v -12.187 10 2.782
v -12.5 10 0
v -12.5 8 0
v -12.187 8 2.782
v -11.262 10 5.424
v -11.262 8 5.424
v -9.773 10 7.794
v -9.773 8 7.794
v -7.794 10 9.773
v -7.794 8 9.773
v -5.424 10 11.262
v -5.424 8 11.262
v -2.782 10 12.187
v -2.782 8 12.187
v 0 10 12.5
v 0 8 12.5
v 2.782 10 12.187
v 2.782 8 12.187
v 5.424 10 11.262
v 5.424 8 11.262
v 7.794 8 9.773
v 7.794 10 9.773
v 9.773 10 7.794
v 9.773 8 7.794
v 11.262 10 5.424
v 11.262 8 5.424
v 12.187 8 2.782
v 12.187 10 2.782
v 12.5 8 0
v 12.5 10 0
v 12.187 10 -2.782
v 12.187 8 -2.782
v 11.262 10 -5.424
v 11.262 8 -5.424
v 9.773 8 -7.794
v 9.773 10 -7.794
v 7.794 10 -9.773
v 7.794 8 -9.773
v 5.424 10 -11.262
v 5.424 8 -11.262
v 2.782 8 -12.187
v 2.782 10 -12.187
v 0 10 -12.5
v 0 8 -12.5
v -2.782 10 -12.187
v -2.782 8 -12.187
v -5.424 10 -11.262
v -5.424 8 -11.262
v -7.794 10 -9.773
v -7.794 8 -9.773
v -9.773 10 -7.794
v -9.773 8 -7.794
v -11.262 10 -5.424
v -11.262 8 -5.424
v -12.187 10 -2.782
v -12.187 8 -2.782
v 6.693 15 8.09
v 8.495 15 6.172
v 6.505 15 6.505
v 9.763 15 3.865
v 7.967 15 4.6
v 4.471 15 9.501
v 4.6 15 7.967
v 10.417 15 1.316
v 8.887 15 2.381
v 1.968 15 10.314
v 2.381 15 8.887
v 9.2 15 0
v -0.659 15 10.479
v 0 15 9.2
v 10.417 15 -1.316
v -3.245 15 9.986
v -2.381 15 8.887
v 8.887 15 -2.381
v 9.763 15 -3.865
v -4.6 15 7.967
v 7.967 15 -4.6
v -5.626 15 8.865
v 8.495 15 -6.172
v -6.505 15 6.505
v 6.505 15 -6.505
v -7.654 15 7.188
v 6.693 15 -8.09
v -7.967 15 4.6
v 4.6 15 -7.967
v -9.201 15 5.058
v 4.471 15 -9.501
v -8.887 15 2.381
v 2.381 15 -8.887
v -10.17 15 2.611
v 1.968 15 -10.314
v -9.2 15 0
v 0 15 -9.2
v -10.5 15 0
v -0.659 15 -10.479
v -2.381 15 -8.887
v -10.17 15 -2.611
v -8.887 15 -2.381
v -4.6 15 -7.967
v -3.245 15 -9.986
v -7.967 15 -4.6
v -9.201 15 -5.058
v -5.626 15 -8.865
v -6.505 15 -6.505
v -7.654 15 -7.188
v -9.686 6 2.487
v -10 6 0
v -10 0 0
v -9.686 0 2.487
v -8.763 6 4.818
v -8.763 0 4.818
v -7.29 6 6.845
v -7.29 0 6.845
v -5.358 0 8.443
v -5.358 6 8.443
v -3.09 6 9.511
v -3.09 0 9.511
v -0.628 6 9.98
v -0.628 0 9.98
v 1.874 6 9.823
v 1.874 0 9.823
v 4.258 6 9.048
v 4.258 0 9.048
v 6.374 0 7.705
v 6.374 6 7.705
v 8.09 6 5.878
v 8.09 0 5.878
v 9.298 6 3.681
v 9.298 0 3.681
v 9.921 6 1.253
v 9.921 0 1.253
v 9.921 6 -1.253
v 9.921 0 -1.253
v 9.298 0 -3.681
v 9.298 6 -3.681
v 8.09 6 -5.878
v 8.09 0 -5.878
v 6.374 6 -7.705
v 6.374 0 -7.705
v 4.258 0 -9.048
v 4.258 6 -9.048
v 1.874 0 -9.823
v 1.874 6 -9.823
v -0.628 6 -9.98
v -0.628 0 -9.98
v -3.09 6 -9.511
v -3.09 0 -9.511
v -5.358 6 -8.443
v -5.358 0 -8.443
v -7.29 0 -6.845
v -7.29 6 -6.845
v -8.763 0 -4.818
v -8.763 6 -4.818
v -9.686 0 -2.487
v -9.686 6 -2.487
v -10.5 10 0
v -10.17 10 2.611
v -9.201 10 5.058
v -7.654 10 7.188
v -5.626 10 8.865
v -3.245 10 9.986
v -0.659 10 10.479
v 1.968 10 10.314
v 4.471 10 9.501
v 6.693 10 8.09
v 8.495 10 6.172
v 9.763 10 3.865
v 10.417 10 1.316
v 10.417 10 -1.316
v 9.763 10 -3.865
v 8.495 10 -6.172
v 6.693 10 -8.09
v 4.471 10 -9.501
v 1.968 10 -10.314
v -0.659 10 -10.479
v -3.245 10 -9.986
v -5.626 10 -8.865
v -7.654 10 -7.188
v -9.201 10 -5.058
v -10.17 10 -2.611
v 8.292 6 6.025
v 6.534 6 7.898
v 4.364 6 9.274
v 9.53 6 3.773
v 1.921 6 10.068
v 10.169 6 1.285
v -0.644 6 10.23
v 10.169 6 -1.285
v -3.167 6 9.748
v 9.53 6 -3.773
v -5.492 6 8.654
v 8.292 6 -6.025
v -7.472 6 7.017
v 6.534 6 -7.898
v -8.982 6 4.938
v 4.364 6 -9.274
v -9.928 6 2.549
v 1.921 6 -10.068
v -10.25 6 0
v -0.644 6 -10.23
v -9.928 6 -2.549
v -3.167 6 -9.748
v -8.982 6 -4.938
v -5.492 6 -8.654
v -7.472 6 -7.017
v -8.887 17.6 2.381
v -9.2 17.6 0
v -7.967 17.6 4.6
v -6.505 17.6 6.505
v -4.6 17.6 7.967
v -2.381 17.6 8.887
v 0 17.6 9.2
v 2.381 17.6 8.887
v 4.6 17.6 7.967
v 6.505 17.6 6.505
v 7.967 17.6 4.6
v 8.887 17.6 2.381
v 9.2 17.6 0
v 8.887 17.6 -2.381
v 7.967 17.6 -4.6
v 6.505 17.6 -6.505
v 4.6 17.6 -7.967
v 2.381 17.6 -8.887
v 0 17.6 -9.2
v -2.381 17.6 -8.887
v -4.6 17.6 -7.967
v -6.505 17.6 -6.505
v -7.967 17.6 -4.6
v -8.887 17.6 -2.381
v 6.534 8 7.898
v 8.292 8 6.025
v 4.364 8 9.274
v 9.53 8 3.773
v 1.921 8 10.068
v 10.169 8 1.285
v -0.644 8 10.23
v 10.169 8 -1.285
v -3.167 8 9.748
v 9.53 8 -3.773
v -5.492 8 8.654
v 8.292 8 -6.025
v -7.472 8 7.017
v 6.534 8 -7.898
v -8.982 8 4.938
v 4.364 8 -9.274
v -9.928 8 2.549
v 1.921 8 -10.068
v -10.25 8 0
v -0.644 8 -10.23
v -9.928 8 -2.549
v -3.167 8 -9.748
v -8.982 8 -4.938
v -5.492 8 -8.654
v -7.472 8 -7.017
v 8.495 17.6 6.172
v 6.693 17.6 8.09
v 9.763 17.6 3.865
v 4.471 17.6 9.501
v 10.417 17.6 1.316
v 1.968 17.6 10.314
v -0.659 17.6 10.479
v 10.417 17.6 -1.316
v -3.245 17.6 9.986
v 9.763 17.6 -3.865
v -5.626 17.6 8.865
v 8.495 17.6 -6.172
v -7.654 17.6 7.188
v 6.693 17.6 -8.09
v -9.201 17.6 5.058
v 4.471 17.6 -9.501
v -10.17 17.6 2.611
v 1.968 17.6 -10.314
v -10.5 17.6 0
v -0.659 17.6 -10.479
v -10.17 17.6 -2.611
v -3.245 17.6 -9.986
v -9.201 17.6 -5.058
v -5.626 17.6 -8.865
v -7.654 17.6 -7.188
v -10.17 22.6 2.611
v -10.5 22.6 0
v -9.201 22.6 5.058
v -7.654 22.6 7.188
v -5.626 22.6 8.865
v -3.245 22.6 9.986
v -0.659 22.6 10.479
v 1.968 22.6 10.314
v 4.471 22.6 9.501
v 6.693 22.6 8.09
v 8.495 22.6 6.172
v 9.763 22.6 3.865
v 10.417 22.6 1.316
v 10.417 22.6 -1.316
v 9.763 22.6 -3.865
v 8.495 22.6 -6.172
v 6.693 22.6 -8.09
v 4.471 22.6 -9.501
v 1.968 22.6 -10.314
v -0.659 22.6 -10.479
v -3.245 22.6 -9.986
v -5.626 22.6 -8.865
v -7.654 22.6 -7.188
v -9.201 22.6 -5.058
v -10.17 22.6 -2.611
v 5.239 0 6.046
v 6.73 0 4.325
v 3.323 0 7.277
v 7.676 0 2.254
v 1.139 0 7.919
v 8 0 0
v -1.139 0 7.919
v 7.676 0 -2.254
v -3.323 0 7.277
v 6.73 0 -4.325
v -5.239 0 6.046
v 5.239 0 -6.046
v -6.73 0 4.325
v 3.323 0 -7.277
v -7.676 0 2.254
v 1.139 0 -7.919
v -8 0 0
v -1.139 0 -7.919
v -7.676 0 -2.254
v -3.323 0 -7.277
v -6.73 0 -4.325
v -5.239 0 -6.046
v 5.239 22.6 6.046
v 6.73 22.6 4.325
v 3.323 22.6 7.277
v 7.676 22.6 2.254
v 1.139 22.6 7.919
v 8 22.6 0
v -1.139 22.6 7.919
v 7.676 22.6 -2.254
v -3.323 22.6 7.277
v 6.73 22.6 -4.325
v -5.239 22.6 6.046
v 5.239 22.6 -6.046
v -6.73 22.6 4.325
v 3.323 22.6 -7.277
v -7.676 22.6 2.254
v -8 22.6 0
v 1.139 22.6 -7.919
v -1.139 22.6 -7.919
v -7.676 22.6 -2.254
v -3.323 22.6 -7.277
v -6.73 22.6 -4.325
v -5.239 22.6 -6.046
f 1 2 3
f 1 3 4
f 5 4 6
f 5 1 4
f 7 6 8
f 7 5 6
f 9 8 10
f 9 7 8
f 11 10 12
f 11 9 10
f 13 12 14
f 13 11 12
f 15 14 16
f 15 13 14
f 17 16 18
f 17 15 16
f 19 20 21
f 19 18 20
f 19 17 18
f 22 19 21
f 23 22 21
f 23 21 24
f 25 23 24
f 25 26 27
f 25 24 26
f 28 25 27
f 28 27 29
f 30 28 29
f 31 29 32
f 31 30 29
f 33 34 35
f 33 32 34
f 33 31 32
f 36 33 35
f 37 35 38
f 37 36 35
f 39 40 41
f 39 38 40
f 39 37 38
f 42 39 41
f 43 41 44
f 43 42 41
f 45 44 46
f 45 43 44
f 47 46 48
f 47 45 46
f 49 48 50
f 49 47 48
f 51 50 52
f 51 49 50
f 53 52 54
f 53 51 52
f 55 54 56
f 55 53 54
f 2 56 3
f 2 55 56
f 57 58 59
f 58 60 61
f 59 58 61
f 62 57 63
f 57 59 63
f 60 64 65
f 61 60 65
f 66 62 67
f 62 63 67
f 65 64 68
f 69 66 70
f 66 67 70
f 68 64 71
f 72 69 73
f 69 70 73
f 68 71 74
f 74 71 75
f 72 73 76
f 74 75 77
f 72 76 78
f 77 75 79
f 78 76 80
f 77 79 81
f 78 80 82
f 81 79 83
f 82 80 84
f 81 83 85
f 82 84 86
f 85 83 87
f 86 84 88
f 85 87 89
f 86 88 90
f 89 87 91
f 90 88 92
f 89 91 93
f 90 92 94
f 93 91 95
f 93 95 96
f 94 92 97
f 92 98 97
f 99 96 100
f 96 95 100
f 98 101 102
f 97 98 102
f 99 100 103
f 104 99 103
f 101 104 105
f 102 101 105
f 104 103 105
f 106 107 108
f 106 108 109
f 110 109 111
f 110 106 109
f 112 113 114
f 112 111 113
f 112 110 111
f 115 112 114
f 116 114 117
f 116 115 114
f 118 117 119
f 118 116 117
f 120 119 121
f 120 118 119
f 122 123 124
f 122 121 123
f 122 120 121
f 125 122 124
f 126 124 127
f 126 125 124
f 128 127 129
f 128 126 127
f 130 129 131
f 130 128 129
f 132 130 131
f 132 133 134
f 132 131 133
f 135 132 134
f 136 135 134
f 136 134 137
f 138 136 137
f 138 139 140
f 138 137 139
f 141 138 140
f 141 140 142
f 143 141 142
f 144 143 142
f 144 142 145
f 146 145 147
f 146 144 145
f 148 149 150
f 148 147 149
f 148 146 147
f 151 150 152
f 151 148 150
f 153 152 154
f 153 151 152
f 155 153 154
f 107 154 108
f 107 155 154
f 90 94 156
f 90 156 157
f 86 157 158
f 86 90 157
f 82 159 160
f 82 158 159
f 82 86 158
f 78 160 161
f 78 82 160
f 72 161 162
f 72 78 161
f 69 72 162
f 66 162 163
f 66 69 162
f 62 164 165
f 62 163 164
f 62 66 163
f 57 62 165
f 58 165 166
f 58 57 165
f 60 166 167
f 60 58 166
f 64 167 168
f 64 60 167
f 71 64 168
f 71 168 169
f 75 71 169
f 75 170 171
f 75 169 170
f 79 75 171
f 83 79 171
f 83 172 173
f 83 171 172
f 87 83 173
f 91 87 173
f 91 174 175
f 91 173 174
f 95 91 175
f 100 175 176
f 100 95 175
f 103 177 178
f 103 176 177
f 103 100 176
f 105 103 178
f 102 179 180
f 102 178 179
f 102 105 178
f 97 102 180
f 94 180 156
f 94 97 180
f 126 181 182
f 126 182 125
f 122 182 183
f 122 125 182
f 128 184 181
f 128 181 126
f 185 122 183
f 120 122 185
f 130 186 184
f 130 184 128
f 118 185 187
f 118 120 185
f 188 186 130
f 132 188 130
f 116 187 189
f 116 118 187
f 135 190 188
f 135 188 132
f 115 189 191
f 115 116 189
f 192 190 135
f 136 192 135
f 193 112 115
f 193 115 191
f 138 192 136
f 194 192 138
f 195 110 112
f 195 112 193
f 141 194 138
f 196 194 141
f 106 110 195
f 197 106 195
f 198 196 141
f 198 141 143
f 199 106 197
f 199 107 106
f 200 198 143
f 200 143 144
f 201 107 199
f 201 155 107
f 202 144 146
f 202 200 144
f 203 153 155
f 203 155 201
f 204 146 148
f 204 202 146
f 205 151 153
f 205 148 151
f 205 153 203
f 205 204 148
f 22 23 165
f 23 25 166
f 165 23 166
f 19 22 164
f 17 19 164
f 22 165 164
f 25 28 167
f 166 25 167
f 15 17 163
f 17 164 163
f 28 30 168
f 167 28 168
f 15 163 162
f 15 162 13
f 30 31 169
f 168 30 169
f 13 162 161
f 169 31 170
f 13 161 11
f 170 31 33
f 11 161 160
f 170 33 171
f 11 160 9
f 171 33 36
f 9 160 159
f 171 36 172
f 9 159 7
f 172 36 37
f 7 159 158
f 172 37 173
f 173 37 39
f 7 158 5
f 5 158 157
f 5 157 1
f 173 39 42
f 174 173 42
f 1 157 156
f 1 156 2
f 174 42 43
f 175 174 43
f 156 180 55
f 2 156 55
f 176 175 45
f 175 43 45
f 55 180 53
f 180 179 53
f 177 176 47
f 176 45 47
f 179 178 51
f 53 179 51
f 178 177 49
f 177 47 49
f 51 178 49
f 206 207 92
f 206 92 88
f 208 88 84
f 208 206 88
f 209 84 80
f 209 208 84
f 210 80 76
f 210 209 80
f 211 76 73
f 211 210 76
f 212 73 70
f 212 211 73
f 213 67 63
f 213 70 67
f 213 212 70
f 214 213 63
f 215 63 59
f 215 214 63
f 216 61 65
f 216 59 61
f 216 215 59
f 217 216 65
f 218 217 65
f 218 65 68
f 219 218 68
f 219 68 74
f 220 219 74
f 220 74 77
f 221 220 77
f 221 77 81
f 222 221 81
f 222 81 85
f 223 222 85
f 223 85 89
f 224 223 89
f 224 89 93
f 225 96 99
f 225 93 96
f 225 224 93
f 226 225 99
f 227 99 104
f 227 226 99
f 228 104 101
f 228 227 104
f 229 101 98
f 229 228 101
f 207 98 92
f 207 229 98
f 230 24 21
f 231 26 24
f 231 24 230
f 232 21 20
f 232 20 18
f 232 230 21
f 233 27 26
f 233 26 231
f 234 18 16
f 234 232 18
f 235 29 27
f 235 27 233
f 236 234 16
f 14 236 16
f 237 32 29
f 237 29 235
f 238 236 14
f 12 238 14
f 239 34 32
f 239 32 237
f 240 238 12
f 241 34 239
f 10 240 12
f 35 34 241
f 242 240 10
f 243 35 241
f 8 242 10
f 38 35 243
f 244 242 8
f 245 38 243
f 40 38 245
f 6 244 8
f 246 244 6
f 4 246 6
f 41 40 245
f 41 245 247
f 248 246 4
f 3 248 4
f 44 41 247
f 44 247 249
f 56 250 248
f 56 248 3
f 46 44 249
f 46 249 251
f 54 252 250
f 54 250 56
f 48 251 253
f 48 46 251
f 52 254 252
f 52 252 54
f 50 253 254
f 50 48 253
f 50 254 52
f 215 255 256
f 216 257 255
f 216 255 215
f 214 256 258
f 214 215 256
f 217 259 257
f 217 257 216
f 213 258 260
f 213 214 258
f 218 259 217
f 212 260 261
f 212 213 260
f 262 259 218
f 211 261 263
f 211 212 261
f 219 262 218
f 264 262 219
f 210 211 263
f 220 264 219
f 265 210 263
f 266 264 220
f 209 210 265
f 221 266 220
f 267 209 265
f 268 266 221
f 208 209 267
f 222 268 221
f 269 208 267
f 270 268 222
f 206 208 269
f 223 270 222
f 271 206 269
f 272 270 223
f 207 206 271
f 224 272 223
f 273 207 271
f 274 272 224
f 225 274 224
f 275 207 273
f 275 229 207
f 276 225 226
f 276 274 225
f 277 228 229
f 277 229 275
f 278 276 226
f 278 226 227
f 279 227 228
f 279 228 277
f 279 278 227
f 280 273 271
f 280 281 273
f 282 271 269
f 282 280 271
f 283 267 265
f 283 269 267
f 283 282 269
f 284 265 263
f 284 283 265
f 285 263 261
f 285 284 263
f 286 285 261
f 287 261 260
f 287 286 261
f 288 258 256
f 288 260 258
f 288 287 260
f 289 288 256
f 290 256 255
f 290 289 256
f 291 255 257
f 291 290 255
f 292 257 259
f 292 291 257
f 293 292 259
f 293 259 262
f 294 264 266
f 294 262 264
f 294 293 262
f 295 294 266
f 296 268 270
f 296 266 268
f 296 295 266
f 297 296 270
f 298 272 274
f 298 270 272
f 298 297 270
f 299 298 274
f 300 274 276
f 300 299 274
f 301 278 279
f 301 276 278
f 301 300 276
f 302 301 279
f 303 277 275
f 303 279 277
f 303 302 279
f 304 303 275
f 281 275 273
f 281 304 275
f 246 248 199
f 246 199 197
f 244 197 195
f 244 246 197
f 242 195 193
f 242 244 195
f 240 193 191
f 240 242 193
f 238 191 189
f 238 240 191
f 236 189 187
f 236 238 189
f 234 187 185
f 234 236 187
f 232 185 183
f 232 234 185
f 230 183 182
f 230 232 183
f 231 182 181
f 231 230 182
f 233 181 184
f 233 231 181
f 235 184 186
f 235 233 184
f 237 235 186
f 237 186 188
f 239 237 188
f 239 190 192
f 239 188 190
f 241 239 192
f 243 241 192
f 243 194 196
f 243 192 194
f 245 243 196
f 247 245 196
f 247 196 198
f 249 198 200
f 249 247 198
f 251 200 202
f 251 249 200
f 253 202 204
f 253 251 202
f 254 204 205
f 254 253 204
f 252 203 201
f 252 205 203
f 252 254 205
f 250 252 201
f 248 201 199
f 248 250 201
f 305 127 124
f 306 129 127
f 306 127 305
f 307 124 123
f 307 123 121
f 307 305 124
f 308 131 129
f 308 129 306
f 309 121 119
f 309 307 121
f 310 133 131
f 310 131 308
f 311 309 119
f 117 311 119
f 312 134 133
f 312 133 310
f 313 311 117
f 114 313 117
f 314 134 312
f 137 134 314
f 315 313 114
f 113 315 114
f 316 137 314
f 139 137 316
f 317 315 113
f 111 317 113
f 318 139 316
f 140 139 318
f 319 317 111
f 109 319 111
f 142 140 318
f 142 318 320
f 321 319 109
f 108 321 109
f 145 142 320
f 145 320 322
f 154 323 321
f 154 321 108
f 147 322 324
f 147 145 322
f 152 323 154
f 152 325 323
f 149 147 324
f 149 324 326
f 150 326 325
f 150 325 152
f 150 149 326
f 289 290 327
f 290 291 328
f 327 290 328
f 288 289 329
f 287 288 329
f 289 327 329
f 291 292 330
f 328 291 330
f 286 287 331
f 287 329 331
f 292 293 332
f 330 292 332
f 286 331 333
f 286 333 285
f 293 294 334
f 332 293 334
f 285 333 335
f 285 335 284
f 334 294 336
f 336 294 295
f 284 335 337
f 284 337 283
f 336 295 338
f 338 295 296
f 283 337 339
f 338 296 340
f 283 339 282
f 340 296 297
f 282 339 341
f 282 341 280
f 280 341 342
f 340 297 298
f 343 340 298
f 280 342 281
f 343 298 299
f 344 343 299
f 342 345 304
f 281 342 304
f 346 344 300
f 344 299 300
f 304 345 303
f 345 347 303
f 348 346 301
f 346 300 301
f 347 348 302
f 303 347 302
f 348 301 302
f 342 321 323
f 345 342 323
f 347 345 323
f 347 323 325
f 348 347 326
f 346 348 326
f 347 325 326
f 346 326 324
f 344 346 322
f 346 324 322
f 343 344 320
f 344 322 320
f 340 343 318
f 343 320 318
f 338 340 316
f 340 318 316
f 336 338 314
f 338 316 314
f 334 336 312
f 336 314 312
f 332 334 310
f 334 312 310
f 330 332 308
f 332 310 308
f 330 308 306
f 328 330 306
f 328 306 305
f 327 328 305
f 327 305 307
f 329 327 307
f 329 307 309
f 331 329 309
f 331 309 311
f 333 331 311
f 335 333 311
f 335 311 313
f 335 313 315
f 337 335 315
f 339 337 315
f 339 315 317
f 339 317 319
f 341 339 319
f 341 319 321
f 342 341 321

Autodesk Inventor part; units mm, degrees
ref_plane "YZ Plane" through (0, 0, 0) normal (1, 0, 0) x (0, 1, 0)
ref_plane "XZ Plane" through (0, 0, 0) normal (0, 1, 0) x (-1, 0, 0)
ref_plane "XY Plane" through (0, 0, 0) normal (0, 0, 1) x (1, 0, 0)
sketch "Sketch3" plane through (0, 0, 0) normal (0, 0, 1) x (1, 0, 0)
  line L0 (0, 0) -> (-10, 0)
  line L1 (-10, 0) -> (-10, 6)
  line L2 (-10, 6) -> (-10.25, 6)
  line L3 (-10.25, 6) -> (-10.25, 8)
  line L4 (-10.25, 8) -> (-12.5, 8)
  line L5 (-12.5, 8) -> (-12.5, 10)
  line L6 (-12.5, 10) -> (-10.5, 10)
  line L7 (-10.5, 10) -> (-10.5, 15)
  line L8 (-10.5, 15) -> (-9.2, 15)
  line L9 (-9.2, 15) -> (-9.2, 17.6)
  line L10 (-9.2, 17.6) -> (-10.5, 17.6)
  line L11 (-10.5, 17.6) -> (-10.5, 22.6)
  line L12 (-10.5, 22.6) -> (0, 22.6)
  line L13 (0, 22.6) -> (0, 0)
  line L14 (0, 22.6) -> (-8, 22.6)
  line L15 (-8, 22.6) -> (-8, 0)
  dimension "d23" = 10
  dimension "d24" = 6
  dimension "d25" = 0.25
  dimension "d26" = 2
  dimension "d27" = 2.25
  dimension "d28" = 2
  dimension "d29" = 2
  dimension "d30" = 5
  dimension "d31" = 1.3
  dimension "d32" = 2.6
  dimension "d33" = 5
  dimension "d34" = 8
revolve "Revolution2" add sketch "Sketch3" angle 360 about axis through (0, 22.6, 0) along (0, -1, 0) contours L0 L1 L2 L3 L4 L5 L6 L7 L8 L9 L10 L11 L12 L15
thread "Thread3" size "M20x2" class "6g" standard "ANSI Metric M Profile" full length
properties part number "Conector Tapa-Corrugado V2" material "Polypropylene"
